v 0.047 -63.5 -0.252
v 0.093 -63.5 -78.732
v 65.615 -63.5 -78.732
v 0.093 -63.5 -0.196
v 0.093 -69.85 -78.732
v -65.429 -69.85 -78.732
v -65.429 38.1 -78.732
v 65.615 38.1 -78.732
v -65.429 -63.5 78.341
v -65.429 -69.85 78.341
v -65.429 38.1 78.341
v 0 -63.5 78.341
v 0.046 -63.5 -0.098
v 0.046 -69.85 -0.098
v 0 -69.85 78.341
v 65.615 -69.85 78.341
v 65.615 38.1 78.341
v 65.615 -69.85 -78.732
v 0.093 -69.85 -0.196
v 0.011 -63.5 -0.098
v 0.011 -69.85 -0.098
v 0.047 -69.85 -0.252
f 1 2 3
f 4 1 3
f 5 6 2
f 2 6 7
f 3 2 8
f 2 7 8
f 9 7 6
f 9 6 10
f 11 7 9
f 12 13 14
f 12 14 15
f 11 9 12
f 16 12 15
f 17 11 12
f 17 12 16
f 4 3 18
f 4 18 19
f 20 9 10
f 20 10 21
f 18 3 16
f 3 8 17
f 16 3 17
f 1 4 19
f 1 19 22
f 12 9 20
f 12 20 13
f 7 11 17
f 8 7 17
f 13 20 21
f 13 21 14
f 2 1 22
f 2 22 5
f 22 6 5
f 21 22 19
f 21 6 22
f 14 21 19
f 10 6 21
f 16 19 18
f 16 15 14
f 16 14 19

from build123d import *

# Parameters (mm, degrees)
F0_W     = 131.0434639454
F0_H     = 157.073289156
F1_DEPTH = 38.1
F3_DEPTH = 25.4
F4_DEPTH = 31.75
F5_DEPTH = 25.4
F6_DEPTH = 25.4


with BuildPart() as f1:
    # F0 (on Front) → F1 (new body, symmetric)
    with BuildSketch(Plane.XZ):
        with Locations((0.093087554, -0.1957640052)):
            Rectangle(F0_W, F0_H)
    extrude(amount=F1_DEPTH, both=True)

    # F2 (on face) → F3 (join)
    with BuildSketch(Plane.XZ.offset(38.1)):
        Polygon((65.6148195267, -78.7324085832), (0.093087554, -0.1957640052), (0.0465768162, -0.2515134058), (0.093087554, -78.7324085832), align=None)
        Polygon((0.0464857272, -0.0978123848), (0, 78.3408805728), (-65.4286444187, 78.3408805728), (0.0113244291, -0.0977598578), align=None)
    extrude(amount=F3_DEPTH)

    # F4 (add): a face of the model
    f4_faces = [f1.faces().sort_by_distance(p)[0] for p in [
        (0.0930765329, -38.1, -0.1771720733),
    ]]
    extrude(f4_faces, amount=F4_DEPTH)

    # F5 (add): a face of the model
    f5_faces = [f1.faces().sort_by_distance(p)[0] for p in [
        (0.093087554, 38.1, -0.1957640052),
    ]]
    extrude(f5_faces, amount=-F5_DEPTH)

    # F6 (add): a face of the model
    f6_faces = [f1.faces().sort_by_distance(p)[0] for p in [
        (0.093087554, 38.1, -0.1957640052),
    ]]
    extrude(f6_faces, amount=-F6_DEPTH)


solid = f1.part
